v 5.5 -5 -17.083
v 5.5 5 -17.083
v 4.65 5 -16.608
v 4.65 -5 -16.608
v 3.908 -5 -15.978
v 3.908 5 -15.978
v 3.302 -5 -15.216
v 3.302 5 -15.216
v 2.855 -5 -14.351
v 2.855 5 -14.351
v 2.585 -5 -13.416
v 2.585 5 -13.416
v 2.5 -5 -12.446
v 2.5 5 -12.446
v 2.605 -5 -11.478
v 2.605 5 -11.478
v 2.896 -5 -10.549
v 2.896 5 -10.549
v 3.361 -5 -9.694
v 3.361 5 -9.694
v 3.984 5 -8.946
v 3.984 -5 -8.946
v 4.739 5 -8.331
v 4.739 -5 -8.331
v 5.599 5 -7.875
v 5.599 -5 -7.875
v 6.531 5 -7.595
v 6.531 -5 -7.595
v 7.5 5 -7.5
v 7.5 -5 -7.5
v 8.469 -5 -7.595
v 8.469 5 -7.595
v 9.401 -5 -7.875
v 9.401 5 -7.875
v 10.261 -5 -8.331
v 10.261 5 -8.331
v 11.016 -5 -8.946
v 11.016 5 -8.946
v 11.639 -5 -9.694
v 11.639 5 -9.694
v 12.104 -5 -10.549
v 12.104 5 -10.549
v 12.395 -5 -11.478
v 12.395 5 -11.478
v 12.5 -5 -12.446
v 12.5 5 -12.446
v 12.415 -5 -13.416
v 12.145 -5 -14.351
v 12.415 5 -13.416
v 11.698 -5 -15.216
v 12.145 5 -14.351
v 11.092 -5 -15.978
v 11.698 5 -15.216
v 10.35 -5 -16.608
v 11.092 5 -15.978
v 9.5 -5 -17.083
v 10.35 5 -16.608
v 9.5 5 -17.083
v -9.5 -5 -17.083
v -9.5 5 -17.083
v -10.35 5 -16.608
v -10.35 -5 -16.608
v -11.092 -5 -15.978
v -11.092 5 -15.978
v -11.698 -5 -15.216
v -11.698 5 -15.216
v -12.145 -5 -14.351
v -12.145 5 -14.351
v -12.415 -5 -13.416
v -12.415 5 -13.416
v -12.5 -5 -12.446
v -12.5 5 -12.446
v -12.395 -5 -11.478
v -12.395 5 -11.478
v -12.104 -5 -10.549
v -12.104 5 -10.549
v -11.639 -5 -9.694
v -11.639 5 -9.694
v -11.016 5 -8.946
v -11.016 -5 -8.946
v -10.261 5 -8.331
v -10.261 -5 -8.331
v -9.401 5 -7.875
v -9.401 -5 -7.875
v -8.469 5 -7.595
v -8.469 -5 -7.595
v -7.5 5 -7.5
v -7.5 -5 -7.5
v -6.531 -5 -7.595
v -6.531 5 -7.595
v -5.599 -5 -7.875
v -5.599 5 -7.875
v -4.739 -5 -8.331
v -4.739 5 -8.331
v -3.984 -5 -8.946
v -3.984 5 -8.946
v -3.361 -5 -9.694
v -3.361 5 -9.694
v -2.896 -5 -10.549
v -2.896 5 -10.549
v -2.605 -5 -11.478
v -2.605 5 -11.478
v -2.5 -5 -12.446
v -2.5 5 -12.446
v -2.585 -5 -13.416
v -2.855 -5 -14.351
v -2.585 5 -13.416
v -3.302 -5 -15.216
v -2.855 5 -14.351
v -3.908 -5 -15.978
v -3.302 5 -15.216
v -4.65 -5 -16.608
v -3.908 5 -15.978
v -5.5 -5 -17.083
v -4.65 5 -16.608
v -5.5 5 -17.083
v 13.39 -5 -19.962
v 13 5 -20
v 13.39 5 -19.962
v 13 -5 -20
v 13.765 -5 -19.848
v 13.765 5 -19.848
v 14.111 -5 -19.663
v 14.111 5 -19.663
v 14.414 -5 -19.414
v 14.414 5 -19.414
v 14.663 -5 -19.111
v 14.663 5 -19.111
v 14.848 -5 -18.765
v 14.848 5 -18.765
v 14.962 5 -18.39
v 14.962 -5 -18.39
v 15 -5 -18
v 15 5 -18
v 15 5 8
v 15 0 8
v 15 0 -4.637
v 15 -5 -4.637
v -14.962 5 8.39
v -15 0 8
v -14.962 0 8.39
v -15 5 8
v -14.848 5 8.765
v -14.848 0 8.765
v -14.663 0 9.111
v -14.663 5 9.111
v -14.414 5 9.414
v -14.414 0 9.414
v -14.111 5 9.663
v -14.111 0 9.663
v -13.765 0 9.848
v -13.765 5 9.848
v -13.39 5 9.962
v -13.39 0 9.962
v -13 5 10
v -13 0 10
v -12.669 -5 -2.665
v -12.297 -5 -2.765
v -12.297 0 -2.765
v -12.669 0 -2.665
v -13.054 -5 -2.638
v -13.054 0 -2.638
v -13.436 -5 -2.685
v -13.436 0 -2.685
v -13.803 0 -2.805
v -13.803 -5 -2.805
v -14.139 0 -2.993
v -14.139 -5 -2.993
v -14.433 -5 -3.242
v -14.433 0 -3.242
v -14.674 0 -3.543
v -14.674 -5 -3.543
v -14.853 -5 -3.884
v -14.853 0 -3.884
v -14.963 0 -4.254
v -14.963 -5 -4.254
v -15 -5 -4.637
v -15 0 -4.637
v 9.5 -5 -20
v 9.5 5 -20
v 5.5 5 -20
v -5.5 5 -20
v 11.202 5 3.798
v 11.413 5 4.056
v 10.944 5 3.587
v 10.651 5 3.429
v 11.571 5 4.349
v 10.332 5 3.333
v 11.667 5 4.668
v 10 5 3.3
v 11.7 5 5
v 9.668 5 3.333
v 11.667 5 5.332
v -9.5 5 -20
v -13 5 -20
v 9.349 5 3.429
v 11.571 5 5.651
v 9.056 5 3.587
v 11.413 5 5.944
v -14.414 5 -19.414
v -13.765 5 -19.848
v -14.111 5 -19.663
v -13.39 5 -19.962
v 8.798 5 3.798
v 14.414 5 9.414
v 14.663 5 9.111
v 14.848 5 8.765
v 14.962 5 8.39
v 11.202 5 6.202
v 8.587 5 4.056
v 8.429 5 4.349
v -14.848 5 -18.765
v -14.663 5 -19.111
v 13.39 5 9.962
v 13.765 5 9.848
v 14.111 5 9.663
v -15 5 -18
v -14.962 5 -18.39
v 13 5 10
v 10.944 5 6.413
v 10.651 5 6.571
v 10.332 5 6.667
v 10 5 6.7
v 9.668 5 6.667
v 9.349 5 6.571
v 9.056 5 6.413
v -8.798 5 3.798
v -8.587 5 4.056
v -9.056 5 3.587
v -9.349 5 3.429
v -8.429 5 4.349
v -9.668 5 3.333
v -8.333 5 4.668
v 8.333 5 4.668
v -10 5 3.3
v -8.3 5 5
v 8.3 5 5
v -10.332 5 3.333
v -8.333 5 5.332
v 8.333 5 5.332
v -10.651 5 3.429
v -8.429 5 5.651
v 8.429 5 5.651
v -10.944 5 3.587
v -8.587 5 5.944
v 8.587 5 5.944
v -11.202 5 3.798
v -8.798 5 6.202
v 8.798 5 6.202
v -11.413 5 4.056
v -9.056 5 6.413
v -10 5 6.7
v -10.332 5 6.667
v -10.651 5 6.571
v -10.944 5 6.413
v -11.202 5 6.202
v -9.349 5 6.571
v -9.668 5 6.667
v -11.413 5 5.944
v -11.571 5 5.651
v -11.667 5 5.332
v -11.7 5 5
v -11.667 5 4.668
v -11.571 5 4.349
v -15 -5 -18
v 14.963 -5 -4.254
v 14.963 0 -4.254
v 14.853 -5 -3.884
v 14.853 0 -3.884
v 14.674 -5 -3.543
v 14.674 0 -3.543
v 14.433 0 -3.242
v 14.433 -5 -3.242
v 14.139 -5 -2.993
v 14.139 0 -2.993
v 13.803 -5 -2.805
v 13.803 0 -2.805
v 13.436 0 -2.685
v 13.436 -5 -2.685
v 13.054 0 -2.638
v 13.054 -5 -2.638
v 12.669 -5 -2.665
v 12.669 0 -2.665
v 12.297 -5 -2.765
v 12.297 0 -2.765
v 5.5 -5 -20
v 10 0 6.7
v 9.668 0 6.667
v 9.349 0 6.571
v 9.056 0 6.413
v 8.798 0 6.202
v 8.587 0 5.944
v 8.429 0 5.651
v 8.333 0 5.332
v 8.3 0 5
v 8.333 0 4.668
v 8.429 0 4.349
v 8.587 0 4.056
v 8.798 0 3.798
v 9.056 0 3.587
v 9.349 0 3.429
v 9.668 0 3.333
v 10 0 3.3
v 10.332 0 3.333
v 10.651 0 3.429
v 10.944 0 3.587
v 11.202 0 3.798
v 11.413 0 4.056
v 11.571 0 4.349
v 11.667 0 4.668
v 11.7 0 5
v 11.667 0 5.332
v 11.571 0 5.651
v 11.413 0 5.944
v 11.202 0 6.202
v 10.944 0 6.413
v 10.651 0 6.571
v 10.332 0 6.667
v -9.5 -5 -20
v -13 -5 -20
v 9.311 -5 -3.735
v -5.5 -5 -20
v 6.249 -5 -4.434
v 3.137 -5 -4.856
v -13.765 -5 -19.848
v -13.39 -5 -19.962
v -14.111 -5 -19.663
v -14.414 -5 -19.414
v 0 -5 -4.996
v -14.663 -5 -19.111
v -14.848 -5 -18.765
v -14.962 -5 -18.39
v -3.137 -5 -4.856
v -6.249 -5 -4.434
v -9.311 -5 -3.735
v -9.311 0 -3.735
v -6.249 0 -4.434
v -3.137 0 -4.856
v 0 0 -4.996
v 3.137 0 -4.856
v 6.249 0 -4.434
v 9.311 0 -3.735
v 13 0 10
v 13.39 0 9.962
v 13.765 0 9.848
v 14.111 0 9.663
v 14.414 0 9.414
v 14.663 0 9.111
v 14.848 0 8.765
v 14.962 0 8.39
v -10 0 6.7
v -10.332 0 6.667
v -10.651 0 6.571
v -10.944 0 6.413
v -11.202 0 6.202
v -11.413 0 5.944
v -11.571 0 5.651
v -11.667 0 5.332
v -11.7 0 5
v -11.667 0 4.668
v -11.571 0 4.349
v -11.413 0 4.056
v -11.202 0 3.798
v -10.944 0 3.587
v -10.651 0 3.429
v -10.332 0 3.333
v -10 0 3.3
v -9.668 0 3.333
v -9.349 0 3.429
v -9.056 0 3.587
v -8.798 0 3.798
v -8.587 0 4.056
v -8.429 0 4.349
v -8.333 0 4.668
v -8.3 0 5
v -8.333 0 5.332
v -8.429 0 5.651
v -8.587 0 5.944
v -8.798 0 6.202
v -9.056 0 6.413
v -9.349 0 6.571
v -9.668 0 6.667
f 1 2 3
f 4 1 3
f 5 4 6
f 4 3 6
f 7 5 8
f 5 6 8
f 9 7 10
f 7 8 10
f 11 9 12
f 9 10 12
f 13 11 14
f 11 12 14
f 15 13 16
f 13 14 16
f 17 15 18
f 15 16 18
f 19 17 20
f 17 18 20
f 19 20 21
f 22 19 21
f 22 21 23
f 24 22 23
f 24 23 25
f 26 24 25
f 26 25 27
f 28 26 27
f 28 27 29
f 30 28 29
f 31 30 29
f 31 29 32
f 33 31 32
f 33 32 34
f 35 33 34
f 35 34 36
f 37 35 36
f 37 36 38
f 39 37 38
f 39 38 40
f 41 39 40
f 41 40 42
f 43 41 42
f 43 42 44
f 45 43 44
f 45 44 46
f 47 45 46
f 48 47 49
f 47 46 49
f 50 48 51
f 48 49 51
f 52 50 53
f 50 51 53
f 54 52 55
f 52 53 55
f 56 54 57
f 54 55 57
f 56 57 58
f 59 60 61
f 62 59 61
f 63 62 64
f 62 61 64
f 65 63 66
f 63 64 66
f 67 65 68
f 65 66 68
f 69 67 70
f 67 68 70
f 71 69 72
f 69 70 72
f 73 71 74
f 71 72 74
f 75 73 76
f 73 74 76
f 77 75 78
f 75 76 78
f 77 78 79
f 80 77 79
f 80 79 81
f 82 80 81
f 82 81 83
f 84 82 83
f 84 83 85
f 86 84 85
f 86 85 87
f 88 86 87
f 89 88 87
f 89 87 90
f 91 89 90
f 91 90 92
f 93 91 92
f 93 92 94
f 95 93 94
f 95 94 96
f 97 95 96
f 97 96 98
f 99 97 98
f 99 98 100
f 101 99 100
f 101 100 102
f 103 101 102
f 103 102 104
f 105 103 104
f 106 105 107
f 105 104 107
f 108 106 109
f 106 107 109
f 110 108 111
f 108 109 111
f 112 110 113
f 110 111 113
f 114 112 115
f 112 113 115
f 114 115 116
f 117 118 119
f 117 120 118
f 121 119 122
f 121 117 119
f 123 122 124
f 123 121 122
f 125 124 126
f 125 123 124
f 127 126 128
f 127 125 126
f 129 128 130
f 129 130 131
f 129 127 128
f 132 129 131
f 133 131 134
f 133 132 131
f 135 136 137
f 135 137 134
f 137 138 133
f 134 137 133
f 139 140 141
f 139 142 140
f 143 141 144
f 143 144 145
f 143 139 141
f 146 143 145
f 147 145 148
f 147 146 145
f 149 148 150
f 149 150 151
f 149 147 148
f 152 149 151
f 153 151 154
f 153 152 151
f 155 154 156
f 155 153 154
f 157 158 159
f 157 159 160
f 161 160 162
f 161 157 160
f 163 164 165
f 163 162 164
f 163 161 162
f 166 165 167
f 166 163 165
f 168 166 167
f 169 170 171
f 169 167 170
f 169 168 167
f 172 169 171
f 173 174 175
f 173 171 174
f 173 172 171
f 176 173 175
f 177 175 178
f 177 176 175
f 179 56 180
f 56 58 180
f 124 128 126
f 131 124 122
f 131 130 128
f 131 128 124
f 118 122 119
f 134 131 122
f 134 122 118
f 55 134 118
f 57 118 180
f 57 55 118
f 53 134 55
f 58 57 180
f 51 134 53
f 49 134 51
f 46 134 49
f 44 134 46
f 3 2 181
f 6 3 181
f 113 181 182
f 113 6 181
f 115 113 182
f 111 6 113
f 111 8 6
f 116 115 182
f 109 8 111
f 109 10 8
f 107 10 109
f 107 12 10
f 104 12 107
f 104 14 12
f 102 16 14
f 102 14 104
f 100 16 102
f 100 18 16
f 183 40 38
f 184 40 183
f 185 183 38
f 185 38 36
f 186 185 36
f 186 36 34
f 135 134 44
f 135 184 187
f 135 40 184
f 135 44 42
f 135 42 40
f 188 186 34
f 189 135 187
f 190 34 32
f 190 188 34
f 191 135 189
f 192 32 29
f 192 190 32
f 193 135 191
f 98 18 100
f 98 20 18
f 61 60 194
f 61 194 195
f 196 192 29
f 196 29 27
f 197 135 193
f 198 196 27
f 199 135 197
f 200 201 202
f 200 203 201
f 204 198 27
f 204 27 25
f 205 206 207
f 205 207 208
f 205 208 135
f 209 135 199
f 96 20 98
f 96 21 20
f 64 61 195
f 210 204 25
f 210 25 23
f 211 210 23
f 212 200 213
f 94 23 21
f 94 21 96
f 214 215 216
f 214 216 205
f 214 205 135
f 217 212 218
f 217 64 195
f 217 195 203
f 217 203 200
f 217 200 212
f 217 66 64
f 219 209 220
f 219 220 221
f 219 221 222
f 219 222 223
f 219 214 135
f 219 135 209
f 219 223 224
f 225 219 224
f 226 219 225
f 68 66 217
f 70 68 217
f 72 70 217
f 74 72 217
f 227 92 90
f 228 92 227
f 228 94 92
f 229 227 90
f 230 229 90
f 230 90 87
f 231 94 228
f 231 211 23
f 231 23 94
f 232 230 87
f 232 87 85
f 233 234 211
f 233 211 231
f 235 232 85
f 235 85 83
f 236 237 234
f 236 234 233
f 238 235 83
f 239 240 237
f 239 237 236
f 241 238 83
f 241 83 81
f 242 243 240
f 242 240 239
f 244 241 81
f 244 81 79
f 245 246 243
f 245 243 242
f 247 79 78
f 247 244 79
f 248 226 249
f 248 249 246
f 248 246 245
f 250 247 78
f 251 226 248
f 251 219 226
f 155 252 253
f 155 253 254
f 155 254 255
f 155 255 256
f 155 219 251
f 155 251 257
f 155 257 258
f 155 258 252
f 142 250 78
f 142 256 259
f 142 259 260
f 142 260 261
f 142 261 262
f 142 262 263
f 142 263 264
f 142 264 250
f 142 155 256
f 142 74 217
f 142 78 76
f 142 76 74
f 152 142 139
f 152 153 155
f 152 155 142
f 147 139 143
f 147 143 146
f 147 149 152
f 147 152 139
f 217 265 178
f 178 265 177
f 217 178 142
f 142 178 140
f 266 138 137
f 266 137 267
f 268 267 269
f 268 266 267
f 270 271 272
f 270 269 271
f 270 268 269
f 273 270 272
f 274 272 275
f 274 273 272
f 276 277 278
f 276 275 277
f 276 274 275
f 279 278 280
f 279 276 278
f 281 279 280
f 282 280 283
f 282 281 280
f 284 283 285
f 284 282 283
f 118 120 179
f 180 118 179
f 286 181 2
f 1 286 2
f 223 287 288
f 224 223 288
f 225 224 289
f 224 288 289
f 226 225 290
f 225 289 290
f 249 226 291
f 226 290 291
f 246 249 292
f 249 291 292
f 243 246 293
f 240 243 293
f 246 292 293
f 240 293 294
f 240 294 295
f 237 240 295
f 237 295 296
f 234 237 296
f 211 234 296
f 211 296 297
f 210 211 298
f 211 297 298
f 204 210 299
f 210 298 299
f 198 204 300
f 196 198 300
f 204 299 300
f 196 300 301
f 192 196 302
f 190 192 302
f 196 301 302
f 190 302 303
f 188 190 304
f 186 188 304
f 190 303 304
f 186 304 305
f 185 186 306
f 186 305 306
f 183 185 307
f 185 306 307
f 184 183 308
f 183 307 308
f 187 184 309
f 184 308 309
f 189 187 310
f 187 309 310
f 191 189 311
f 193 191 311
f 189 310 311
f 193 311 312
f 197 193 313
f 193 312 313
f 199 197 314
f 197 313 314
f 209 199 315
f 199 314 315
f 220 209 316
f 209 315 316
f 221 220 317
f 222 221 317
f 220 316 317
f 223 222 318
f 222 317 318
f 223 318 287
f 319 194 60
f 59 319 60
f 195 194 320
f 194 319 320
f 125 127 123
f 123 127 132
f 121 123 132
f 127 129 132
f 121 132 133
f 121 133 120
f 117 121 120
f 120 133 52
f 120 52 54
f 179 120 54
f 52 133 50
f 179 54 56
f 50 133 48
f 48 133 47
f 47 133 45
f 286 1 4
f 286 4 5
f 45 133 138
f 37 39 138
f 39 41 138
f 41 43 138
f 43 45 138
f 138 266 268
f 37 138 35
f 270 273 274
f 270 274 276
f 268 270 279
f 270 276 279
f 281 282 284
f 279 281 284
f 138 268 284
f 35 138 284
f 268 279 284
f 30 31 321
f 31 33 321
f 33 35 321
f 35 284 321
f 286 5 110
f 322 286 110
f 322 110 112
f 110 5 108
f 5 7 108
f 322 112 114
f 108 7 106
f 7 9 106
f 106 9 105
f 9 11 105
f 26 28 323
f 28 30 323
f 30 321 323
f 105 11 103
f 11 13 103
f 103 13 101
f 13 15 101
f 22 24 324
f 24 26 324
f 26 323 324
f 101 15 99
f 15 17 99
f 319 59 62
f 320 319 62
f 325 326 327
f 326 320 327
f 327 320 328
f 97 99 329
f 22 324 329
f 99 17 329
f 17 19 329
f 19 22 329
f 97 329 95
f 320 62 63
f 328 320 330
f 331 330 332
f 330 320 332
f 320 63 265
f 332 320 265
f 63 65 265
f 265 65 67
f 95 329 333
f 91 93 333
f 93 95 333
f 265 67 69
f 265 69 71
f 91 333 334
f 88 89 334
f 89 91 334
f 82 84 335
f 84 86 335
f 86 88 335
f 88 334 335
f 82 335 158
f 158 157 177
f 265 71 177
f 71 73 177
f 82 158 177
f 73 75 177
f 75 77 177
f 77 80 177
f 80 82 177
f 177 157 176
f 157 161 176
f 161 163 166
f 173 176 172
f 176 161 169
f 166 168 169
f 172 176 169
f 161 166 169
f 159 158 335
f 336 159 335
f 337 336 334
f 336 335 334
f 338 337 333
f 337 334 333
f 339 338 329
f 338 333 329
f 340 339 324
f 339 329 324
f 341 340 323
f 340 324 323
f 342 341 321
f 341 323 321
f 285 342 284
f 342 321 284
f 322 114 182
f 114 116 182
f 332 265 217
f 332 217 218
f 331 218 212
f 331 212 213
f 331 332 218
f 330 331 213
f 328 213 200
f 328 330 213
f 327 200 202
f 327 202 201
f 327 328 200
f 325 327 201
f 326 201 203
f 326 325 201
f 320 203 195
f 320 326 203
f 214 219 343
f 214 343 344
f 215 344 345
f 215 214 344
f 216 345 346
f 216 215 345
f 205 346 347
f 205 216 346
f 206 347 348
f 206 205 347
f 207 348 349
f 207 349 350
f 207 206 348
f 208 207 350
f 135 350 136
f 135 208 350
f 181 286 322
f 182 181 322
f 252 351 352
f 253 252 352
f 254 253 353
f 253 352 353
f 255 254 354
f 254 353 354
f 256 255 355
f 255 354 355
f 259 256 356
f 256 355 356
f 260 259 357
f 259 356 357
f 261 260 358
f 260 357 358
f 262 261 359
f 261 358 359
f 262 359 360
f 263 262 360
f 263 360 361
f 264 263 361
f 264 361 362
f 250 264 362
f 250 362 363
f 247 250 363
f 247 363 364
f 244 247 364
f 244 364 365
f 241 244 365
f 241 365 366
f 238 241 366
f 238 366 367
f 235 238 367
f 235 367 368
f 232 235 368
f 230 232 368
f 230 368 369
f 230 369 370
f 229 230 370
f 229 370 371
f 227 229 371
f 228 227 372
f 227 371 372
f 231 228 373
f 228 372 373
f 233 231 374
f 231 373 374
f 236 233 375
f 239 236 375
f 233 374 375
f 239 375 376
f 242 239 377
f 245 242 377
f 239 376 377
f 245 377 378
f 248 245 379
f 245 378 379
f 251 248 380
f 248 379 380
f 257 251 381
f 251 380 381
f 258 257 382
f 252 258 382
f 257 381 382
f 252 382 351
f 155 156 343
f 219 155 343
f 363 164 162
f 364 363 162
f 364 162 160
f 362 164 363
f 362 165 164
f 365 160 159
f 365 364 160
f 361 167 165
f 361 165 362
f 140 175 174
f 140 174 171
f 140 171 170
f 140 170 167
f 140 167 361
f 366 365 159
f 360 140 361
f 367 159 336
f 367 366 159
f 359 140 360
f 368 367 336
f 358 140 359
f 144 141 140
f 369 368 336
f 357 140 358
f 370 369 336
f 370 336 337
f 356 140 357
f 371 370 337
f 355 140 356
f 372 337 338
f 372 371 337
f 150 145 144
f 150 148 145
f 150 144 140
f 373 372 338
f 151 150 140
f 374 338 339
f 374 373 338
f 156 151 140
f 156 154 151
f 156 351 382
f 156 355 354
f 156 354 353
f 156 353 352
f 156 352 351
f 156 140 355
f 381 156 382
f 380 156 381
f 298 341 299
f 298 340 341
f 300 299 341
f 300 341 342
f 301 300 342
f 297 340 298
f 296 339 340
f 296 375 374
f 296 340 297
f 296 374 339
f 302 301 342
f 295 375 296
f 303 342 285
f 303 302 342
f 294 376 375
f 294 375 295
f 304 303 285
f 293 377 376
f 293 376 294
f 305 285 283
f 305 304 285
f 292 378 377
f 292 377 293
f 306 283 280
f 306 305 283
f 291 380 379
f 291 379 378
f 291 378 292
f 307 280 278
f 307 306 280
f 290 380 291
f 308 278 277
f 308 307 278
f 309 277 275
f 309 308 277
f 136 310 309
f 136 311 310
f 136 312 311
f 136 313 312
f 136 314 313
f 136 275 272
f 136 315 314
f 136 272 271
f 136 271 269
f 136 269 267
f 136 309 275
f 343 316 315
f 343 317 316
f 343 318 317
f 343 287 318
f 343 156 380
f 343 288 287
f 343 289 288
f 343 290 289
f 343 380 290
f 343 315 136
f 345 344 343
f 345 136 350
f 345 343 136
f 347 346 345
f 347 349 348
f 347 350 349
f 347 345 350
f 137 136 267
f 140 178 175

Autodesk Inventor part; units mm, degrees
ref_plane "YZ Plane" through (0, 0, 0) normal (1, 0, 0) x (0, 1, 0)
ref_plane "XZ Plane" through (0, 0, 0) normal (0, 1, 0) x (-1, 0, 0)
ref_plane "XY Plane" through (0, 0, 0) normal (0, 0, 1) x (1, 0, 0)
sketch "スケッチ1" plane through (0, 0, 0) normal (0, 1, 0) x (-1, 0, 0)
  line L0 (15, 10) -> (-15, 10)
  line L1 (-15, 10) -> (-15, -20)
  line L2 (-15, -20) -> (15, -20)
  line L3 (15, -20) -> (15, 10)
  line L4 (15, 10) -> (-15, -20) construction
  line L5 (-15, 10) -> (15, -20) construction
  point P0 (0, 0)
  point P1 (0, -5)
  dimension "d0" = 30
  dimension "d15" = 10
  dimension "d16" = 20
extrude "押し出し1" add sketch "スケッチ1" along normal mid plane 10
sketch "スケッチ2" plane through (0, 5, 0) normal (0, 1, 0) x (1, 0, 0)
  line L0 (-15, -10) -> (15, -10) projected
  point P0 (0, 0)
  point P1 (-10, -5)
  point P2 (10, -5)
  dimension "d4" = 10
  dimension "d5" = 10
  dimension "d6" = 5
hole "穴1" at (-10, 5, 5) at (10, 5, 5) direction (0, -1, 0) diameter 3.4 end through all clearance for "Socket Head Cap Screw" size "M3" standard "Ansi Metric M Profile"
sketch "スケッチ3" plane through (0, -5, 0) normal (0, -1, 0) x (1, 0, 0)
  circle A0 centre (0, 30) radius 34.9965
  circle A1 centre (-10, 5) radius 1.7 projected
  point P0 (0, 0)
  dimension "d17" = 25
  dimension "d18" = 69.993
extrude "押し出し2" cut sketch "スケッチ3" against normal blind 5
fillet "フィレット1" radius 2 2 edges at (15, -2.5, -1.6189) (-15, -2.5, -1.6189)
fillet "フィレット2" radius 2 2 edges at (15, 2.5, 10) (-15, 2.5, 10)
fillet "フィレット3" radius 2 2 edges at (15, 0, -20) (-15, 0, -20)
sketch "スケッチ4" plane through (0, 5, 0) normal (0, 1, 0) x (1, 0, 0)
  circle A0 centre (-7.5, 12.5) radius 5
  circle A1 centre (7.5, 12.5) radius 5
  line L0 (13, 20) -> (-13, 20) projected
  line L1 (-15, 18) -> (-15, -8) projected
  line L2 (15, -8) -> (15, 18) projected
  point P0 (0, 0)
  dimension "d26" = 10
  dimension "d27" = 10
  dimension "d28" = 7.5
  dimension "d29" = 7.5
  dimension "d30" = 7.5
  dimension "d31" = 7.5
extrude "押し出し3" cut sketch "スケッチ4" against normal through all
sketch "スケッチ5" plane through (0, 5, 0) normal (0, 1, 0) x (1, 0, 0)
  circle A0 centre (-7.5, 12.5) radius 5 projected
  circle A1 centre (7.5, 12.5) radius 5 projected
  line L0 (-9.5, 17.0826) -> (-5.5, 17.0826)
  line L1 (-5.5, 17.0826) -> (-5.5, 20)
  line L2 (-5.5, 20) -> (-9.5, 20)
  line L3 (-9.5, 20) -> (-9.5, 17.0826)
  line L4 (-9.5, 17.0826) -> (-5.5, 20) construction
  line L5 (-5.5, 17.0826) -> (-9.5, 20) construction
  line L6 (5.5, 17.0826) -> (9.5, 17.0826)
  line L7 (9.5, 17.0826) -> (9.5, 20)
  line L8 (9.5, 20) -> (5.5, 20)
  line L9 (5.5, 20) -> (5.5, 17.0826)
  line L10 (5.5, 17.0826) -> (9.5, 20) construction
  line L11 (9.5, 17.0826) -> (5.5, 20) construction
  line L12 (13, 20) -> (-13, 20) projected
  point P0 (0, 0)
  point P1 (-7.5, 18.5413)
  point P2 (7.5, 18.5413)
  point P3 (-7.5, 18.5413)
  point P4 (7.5, 18.5413)
  dimension "d34" = 4
  dimension "d35" = 4
extrude "押し出し4" cut sketch "スケッチ5" against normal through all contours L8 L7 A1 L9 | L0 A0 | A0 L3 L2 L1 | A1 L6 picked at (-7.8405, 17.1866) picked at (7.1595, 17.1866)
equation "\"d29\" = d28"
equation "\"d30\" = d28"
equation "\"d31\" = d29"
equation "\"d35\" = d34"
properties part number "scara-base11" material "ABS プラスチック"
